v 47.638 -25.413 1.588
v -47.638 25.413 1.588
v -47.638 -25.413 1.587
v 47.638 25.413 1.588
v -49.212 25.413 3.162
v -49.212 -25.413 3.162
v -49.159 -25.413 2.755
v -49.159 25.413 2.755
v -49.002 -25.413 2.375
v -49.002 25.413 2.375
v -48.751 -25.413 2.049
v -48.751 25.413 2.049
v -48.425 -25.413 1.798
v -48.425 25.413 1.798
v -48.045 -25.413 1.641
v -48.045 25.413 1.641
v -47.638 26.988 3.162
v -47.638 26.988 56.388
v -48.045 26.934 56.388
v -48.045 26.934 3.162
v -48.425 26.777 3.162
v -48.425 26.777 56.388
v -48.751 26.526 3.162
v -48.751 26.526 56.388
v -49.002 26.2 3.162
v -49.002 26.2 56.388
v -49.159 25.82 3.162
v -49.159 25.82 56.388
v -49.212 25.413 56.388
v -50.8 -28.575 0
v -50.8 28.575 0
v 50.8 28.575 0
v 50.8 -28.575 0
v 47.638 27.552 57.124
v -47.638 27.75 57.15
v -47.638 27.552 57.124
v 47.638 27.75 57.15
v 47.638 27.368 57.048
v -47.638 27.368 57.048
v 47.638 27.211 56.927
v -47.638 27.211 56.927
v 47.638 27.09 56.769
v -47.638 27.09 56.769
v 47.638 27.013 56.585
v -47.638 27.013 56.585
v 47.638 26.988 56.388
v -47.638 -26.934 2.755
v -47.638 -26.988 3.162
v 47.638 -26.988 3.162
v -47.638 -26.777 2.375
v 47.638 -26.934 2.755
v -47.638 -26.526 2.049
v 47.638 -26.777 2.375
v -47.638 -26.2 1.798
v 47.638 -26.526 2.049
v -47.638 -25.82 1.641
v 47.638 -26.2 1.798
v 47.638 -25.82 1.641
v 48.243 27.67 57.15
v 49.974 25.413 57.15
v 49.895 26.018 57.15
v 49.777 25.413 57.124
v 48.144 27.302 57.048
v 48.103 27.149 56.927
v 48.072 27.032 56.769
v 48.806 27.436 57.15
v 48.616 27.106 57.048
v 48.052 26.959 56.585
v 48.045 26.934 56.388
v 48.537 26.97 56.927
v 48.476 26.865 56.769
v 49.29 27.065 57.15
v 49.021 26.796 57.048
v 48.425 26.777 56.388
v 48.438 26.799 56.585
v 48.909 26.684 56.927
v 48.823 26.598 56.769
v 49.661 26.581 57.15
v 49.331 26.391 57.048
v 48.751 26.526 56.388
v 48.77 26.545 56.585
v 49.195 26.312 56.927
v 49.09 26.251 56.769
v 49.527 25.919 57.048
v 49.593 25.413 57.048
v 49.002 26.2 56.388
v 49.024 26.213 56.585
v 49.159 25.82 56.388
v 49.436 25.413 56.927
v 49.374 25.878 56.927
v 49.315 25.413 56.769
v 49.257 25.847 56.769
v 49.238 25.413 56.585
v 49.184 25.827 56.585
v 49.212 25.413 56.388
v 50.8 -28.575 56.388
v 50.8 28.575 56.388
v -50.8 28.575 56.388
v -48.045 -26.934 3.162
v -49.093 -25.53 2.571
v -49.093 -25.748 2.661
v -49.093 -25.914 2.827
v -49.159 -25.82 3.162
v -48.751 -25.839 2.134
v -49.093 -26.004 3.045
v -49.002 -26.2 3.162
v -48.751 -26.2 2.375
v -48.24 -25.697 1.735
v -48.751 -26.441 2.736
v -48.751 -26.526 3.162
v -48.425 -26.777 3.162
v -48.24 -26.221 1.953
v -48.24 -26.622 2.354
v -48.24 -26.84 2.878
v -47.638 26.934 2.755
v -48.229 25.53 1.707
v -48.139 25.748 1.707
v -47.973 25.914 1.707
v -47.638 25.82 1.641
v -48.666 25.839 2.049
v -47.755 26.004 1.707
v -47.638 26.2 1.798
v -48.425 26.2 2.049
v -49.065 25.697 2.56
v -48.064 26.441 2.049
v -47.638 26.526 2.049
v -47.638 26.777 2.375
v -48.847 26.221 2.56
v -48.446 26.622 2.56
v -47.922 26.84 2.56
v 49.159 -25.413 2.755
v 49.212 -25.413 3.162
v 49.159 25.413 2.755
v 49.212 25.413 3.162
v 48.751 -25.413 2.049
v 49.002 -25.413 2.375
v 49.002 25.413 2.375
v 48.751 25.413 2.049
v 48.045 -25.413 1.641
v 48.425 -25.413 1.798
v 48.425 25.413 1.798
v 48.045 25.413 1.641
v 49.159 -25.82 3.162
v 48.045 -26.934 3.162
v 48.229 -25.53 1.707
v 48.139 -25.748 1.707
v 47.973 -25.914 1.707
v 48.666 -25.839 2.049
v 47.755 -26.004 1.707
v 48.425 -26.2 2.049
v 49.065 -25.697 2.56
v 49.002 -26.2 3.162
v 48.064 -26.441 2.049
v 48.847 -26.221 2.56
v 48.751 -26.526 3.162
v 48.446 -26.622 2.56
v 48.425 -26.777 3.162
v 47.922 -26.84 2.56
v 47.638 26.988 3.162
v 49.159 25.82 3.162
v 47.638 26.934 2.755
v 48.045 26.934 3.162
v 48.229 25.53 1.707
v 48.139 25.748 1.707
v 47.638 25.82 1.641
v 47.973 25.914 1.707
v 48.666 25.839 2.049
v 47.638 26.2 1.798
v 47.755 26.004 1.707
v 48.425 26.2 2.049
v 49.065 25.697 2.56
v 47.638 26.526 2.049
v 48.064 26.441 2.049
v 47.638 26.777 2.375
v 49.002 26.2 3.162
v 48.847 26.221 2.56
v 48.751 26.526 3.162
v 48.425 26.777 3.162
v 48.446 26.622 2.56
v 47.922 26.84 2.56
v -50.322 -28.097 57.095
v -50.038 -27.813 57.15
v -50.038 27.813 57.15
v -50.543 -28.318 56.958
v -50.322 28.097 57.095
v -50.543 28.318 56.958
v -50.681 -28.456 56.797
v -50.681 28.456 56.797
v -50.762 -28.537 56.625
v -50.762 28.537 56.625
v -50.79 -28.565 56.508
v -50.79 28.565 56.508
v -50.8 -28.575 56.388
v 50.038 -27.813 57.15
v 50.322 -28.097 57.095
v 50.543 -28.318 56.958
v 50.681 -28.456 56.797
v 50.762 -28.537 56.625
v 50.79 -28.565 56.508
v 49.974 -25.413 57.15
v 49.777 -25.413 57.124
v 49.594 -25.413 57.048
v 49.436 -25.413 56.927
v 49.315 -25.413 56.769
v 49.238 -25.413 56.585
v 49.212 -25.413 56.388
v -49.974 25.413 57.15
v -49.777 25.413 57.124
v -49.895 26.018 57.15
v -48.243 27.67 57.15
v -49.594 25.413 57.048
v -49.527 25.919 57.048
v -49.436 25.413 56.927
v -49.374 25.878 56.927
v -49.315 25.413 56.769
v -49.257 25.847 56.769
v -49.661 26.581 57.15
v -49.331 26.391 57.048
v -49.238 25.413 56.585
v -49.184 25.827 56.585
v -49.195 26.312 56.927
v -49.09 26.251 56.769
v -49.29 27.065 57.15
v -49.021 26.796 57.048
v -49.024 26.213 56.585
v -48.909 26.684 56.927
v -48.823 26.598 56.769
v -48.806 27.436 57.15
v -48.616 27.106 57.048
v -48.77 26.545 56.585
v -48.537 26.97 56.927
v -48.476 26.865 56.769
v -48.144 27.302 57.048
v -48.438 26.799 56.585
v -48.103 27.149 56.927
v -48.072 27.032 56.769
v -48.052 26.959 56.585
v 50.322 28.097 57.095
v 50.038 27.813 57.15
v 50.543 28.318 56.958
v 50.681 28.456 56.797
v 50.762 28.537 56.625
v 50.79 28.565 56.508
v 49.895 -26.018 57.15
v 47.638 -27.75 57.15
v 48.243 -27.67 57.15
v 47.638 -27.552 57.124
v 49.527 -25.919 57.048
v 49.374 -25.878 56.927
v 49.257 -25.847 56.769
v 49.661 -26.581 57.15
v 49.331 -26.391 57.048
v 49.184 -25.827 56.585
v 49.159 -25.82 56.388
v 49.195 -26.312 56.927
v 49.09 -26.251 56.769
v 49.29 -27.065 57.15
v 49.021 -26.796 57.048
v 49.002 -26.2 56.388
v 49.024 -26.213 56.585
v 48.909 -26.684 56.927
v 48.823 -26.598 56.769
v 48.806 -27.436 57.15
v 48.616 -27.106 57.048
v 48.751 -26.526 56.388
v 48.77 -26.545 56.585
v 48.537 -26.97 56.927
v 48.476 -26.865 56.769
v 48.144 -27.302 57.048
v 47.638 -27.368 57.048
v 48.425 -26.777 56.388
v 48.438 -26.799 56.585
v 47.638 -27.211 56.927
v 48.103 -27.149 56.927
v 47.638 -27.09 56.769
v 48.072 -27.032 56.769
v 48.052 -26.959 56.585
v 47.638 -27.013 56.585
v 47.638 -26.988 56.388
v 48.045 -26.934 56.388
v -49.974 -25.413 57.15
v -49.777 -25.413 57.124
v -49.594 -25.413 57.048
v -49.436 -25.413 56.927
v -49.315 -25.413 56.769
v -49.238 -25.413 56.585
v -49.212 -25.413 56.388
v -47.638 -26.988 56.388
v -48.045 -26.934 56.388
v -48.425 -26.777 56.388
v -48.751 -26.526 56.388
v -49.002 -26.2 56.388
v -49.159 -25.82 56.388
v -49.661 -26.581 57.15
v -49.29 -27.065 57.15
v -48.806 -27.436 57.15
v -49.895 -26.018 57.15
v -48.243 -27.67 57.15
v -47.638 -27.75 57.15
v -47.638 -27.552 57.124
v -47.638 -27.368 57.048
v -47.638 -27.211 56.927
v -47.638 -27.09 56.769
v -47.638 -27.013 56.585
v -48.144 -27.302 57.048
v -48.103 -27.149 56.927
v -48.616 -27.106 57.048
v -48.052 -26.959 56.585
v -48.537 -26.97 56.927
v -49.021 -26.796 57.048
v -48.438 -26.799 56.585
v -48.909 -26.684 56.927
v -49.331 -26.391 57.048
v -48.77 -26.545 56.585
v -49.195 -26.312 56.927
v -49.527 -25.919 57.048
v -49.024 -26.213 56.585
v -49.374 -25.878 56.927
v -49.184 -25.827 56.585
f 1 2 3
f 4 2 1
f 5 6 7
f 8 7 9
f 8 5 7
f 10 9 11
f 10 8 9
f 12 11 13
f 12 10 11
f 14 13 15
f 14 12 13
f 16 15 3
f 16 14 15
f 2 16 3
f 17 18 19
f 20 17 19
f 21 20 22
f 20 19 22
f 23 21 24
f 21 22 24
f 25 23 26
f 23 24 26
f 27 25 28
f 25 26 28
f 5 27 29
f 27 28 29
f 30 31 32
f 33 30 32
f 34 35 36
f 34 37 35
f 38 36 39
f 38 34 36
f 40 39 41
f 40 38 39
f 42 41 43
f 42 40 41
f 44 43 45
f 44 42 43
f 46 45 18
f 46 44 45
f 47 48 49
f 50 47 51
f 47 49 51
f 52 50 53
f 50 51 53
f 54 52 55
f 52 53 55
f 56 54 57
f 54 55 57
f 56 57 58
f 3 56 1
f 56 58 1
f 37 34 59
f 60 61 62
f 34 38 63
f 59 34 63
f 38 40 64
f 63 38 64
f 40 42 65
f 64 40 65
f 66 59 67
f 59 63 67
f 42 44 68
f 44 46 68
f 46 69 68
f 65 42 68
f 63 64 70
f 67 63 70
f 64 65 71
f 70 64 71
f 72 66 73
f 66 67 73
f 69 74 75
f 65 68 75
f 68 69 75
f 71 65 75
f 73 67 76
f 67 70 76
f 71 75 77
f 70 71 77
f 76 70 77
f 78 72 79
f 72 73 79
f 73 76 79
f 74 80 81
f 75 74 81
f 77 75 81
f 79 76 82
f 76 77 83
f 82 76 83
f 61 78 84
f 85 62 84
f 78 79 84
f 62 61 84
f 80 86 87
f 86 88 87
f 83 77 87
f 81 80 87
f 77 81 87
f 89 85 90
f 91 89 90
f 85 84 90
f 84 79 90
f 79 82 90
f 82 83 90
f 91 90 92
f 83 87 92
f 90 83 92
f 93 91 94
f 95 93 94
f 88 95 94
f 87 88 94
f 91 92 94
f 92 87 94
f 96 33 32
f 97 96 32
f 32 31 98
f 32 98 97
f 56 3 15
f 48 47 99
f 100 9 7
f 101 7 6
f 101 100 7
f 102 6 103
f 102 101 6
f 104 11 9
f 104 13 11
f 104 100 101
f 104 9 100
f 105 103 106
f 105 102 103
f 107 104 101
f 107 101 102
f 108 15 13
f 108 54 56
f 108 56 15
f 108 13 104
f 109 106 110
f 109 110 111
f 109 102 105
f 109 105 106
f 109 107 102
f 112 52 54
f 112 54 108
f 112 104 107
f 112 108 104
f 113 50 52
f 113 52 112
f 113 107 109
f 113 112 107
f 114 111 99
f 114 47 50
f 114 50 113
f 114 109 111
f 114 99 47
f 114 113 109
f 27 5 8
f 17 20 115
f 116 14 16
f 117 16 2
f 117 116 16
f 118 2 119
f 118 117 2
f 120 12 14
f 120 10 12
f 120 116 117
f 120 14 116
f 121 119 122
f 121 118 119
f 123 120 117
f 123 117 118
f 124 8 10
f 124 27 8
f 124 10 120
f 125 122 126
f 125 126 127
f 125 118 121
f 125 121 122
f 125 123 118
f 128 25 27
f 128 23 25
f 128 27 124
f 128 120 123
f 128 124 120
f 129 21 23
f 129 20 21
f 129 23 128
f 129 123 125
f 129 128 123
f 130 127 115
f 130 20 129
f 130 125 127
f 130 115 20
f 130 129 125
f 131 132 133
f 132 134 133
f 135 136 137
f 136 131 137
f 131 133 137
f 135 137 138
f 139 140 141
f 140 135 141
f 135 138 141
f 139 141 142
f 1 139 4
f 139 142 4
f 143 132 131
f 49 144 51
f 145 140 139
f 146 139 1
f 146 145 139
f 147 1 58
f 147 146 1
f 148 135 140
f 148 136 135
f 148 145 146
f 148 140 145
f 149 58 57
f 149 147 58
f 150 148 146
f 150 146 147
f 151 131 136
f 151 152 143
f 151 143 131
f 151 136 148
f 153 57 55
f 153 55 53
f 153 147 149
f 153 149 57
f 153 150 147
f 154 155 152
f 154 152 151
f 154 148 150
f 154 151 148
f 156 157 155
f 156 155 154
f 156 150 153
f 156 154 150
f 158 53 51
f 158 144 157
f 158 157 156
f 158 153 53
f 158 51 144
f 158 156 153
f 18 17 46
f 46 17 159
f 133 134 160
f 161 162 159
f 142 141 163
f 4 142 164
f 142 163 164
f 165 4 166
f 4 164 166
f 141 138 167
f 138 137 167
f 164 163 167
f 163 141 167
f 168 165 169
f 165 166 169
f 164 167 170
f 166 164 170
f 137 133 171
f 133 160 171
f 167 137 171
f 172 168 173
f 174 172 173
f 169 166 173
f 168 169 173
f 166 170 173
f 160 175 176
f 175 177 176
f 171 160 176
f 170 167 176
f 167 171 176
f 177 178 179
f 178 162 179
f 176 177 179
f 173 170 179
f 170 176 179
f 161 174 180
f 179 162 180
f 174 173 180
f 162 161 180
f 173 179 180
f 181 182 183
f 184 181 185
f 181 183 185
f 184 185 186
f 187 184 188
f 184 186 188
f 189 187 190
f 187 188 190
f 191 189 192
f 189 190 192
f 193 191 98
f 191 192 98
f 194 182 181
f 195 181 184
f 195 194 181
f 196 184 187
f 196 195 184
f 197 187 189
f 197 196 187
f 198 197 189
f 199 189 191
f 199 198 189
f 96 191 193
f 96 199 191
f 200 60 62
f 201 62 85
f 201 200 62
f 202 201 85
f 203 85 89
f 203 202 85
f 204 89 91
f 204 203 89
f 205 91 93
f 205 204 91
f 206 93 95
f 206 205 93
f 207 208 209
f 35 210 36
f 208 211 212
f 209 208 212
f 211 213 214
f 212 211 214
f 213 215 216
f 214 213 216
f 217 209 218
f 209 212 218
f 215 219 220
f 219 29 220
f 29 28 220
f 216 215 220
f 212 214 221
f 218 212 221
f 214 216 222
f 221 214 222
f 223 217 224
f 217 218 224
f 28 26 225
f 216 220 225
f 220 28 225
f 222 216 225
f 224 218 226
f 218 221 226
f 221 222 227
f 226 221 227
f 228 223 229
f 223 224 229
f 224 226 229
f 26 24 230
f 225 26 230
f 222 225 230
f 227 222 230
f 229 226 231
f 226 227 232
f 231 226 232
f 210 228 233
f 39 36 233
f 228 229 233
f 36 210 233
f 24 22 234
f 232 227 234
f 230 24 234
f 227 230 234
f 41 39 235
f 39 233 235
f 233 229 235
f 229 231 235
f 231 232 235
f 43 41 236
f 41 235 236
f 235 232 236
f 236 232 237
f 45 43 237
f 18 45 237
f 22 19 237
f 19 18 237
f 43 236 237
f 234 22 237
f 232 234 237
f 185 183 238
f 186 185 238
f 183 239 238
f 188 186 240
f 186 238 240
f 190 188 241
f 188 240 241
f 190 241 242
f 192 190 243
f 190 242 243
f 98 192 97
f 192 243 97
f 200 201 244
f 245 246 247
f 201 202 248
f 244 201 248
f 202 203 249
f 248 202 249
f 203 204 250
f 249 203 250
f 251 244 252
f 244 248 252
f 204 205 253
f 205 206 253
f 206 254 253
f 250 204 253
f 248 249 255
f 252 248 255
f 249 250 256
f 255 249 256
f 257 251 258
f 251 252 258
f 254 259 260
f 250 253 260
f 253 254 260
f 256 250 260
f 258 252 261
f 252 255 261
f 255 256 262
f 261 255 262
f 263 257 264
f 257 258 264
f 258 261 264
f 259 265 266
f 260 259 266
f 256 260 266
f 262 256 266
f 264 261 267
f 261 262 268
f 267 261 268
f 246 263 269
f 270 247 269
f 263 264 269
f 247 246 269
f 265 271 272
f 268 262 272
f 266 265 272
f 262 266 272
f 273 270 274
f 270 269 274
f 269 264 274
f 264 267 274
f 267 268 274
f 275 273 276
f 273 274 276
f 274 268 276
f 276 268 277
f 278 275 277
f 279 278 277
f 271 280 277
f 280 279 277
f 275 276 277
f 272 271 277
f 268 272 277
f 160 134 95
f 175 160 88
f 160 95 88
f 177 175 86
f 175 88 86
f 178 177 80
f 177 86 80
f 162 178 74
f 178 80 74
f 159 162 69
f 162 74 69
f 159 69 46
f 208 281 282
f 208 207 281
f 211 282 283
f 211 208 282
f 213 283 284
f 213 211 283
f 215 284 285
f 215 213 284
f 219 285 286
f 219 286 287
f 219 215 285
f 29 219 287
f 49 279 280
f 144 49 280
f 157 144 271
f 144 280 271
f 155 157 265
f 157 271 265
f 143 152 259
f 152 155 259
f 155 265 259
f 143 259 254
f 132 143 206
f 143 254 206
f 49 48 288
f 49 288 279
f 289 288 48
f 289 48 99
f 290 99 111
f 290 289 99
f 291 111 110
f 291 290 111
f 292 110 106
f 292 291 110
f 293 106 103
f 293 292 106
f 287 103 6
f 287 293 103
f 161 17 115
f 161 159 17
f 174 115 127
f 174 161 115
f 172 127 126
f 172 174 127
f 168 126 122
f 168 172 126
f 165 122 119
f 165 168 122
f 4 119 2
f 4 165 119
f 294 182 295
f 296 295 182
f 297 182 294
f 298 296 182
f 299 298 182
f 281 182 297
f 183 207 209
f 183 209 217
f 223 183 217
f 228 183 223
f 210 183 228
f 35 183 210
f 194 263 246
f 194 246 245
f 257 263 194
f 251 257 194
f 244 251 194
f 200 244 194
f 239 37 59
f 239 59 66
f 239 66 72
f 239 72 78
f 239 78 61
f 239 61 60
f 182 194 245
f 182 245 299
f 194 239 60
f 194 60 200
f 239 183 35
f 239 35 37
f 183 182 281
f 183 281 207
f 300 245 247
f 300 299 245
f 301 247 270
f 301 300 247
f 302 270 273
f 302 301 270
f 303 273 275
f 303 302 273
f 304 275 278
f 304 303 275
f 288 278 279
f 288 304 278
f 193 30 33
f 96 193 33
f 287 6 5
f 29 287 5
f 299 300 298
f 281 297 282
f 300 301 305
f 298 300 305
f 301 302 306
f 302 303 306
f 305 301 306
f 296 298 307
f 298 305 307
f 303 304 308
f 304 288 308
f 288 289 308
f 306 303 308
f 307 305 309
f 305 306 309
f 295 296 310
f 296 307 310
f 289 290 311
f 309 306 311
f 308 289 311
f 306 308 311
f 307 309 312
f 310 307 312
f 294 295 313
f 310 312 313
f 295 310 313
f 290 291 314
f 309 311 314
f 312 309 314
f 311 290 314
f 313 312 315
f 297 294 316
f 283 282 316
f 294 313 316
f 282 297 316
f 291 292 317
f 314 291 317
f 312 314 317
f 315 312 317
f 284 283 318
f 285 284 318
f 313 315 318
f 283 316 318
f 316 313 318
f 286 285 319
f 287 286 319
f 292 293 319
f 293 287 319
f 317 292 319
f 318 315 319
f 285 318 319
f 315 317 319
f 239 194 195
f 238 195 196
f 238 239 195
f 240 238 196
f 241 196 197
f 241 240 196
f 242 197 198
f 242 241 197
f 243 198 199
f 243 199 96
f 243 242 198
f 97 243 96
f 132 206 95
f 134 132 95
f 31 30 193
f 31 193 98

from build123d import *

# Parameters (mm, degrees)
F0_W     = 101.6
F0_H     = 57.15
F0_W_2   = 98.425
F0_H_2   = 53.975
F1_DEPTH = 57.15
F2_DEPTH = 1.5875
F3_R     = 1.5748
F4_R     = 0.762
F5_R     = 20.6375
F6_DEPTH = 6.35


with BuildPart() as f1:
    # F0 (on Top) → F1 (new body)
    with BuildSketch(Plane.XY):
        Rectangle(F0_W, F0_H)
        Rectangle(F0_W_2, F0_H_2, mode=Mode.SUBTRACT)
    extrude(amount=F1_DEPTH)

    # F0 (on Top) → F2 (join)
    with BuildSketch(Plane.XY):
        Rectangle(F0_W_2, F0_H_2)
    extrude(amount=F2_DEPTH)

    # F3
    f3_edges = [f1.edges().sort_by_distance(p)[0] for p in [
        (-49.2125, 26.9875, 29.36875),
        (49.2125, 26.9875, 29.36875),
        (49.2125, -26.9875, 29.36875),
        (49.2125, 0, 1.5875),
        (0, -26.9875, 1.5875),
        (-49.2125, 0, 1.5875),
        (0, 26.9875, 1.5875),
        (-49.2125, -26.9875, 29.36875),
    ]]
    fillet(f3_edges, radius=F3_R)

    # F4
    f4_edges = [f1.edges().sort_by_distance(p)[0] for p in [
        (0, -28.575, 57.15),
        (50.8, 0, 57.15),
        (0, 28.575, 57.15),
        (-50.8, 0, 57.15),
        (-49.2125, 0, 57.15),
    ]]
    fillet(f4_edges, radius=F4_R)


with BuildPart() as f6:
    # F5 (on Front) → F6 (new body)
    with BuildSketch(Plane.XZ):
        with Locations((-50.13819, -40.545423)):
            Circle(F5_R)
    extrude(amount=F6_DEPTH)


solid = f1.part
